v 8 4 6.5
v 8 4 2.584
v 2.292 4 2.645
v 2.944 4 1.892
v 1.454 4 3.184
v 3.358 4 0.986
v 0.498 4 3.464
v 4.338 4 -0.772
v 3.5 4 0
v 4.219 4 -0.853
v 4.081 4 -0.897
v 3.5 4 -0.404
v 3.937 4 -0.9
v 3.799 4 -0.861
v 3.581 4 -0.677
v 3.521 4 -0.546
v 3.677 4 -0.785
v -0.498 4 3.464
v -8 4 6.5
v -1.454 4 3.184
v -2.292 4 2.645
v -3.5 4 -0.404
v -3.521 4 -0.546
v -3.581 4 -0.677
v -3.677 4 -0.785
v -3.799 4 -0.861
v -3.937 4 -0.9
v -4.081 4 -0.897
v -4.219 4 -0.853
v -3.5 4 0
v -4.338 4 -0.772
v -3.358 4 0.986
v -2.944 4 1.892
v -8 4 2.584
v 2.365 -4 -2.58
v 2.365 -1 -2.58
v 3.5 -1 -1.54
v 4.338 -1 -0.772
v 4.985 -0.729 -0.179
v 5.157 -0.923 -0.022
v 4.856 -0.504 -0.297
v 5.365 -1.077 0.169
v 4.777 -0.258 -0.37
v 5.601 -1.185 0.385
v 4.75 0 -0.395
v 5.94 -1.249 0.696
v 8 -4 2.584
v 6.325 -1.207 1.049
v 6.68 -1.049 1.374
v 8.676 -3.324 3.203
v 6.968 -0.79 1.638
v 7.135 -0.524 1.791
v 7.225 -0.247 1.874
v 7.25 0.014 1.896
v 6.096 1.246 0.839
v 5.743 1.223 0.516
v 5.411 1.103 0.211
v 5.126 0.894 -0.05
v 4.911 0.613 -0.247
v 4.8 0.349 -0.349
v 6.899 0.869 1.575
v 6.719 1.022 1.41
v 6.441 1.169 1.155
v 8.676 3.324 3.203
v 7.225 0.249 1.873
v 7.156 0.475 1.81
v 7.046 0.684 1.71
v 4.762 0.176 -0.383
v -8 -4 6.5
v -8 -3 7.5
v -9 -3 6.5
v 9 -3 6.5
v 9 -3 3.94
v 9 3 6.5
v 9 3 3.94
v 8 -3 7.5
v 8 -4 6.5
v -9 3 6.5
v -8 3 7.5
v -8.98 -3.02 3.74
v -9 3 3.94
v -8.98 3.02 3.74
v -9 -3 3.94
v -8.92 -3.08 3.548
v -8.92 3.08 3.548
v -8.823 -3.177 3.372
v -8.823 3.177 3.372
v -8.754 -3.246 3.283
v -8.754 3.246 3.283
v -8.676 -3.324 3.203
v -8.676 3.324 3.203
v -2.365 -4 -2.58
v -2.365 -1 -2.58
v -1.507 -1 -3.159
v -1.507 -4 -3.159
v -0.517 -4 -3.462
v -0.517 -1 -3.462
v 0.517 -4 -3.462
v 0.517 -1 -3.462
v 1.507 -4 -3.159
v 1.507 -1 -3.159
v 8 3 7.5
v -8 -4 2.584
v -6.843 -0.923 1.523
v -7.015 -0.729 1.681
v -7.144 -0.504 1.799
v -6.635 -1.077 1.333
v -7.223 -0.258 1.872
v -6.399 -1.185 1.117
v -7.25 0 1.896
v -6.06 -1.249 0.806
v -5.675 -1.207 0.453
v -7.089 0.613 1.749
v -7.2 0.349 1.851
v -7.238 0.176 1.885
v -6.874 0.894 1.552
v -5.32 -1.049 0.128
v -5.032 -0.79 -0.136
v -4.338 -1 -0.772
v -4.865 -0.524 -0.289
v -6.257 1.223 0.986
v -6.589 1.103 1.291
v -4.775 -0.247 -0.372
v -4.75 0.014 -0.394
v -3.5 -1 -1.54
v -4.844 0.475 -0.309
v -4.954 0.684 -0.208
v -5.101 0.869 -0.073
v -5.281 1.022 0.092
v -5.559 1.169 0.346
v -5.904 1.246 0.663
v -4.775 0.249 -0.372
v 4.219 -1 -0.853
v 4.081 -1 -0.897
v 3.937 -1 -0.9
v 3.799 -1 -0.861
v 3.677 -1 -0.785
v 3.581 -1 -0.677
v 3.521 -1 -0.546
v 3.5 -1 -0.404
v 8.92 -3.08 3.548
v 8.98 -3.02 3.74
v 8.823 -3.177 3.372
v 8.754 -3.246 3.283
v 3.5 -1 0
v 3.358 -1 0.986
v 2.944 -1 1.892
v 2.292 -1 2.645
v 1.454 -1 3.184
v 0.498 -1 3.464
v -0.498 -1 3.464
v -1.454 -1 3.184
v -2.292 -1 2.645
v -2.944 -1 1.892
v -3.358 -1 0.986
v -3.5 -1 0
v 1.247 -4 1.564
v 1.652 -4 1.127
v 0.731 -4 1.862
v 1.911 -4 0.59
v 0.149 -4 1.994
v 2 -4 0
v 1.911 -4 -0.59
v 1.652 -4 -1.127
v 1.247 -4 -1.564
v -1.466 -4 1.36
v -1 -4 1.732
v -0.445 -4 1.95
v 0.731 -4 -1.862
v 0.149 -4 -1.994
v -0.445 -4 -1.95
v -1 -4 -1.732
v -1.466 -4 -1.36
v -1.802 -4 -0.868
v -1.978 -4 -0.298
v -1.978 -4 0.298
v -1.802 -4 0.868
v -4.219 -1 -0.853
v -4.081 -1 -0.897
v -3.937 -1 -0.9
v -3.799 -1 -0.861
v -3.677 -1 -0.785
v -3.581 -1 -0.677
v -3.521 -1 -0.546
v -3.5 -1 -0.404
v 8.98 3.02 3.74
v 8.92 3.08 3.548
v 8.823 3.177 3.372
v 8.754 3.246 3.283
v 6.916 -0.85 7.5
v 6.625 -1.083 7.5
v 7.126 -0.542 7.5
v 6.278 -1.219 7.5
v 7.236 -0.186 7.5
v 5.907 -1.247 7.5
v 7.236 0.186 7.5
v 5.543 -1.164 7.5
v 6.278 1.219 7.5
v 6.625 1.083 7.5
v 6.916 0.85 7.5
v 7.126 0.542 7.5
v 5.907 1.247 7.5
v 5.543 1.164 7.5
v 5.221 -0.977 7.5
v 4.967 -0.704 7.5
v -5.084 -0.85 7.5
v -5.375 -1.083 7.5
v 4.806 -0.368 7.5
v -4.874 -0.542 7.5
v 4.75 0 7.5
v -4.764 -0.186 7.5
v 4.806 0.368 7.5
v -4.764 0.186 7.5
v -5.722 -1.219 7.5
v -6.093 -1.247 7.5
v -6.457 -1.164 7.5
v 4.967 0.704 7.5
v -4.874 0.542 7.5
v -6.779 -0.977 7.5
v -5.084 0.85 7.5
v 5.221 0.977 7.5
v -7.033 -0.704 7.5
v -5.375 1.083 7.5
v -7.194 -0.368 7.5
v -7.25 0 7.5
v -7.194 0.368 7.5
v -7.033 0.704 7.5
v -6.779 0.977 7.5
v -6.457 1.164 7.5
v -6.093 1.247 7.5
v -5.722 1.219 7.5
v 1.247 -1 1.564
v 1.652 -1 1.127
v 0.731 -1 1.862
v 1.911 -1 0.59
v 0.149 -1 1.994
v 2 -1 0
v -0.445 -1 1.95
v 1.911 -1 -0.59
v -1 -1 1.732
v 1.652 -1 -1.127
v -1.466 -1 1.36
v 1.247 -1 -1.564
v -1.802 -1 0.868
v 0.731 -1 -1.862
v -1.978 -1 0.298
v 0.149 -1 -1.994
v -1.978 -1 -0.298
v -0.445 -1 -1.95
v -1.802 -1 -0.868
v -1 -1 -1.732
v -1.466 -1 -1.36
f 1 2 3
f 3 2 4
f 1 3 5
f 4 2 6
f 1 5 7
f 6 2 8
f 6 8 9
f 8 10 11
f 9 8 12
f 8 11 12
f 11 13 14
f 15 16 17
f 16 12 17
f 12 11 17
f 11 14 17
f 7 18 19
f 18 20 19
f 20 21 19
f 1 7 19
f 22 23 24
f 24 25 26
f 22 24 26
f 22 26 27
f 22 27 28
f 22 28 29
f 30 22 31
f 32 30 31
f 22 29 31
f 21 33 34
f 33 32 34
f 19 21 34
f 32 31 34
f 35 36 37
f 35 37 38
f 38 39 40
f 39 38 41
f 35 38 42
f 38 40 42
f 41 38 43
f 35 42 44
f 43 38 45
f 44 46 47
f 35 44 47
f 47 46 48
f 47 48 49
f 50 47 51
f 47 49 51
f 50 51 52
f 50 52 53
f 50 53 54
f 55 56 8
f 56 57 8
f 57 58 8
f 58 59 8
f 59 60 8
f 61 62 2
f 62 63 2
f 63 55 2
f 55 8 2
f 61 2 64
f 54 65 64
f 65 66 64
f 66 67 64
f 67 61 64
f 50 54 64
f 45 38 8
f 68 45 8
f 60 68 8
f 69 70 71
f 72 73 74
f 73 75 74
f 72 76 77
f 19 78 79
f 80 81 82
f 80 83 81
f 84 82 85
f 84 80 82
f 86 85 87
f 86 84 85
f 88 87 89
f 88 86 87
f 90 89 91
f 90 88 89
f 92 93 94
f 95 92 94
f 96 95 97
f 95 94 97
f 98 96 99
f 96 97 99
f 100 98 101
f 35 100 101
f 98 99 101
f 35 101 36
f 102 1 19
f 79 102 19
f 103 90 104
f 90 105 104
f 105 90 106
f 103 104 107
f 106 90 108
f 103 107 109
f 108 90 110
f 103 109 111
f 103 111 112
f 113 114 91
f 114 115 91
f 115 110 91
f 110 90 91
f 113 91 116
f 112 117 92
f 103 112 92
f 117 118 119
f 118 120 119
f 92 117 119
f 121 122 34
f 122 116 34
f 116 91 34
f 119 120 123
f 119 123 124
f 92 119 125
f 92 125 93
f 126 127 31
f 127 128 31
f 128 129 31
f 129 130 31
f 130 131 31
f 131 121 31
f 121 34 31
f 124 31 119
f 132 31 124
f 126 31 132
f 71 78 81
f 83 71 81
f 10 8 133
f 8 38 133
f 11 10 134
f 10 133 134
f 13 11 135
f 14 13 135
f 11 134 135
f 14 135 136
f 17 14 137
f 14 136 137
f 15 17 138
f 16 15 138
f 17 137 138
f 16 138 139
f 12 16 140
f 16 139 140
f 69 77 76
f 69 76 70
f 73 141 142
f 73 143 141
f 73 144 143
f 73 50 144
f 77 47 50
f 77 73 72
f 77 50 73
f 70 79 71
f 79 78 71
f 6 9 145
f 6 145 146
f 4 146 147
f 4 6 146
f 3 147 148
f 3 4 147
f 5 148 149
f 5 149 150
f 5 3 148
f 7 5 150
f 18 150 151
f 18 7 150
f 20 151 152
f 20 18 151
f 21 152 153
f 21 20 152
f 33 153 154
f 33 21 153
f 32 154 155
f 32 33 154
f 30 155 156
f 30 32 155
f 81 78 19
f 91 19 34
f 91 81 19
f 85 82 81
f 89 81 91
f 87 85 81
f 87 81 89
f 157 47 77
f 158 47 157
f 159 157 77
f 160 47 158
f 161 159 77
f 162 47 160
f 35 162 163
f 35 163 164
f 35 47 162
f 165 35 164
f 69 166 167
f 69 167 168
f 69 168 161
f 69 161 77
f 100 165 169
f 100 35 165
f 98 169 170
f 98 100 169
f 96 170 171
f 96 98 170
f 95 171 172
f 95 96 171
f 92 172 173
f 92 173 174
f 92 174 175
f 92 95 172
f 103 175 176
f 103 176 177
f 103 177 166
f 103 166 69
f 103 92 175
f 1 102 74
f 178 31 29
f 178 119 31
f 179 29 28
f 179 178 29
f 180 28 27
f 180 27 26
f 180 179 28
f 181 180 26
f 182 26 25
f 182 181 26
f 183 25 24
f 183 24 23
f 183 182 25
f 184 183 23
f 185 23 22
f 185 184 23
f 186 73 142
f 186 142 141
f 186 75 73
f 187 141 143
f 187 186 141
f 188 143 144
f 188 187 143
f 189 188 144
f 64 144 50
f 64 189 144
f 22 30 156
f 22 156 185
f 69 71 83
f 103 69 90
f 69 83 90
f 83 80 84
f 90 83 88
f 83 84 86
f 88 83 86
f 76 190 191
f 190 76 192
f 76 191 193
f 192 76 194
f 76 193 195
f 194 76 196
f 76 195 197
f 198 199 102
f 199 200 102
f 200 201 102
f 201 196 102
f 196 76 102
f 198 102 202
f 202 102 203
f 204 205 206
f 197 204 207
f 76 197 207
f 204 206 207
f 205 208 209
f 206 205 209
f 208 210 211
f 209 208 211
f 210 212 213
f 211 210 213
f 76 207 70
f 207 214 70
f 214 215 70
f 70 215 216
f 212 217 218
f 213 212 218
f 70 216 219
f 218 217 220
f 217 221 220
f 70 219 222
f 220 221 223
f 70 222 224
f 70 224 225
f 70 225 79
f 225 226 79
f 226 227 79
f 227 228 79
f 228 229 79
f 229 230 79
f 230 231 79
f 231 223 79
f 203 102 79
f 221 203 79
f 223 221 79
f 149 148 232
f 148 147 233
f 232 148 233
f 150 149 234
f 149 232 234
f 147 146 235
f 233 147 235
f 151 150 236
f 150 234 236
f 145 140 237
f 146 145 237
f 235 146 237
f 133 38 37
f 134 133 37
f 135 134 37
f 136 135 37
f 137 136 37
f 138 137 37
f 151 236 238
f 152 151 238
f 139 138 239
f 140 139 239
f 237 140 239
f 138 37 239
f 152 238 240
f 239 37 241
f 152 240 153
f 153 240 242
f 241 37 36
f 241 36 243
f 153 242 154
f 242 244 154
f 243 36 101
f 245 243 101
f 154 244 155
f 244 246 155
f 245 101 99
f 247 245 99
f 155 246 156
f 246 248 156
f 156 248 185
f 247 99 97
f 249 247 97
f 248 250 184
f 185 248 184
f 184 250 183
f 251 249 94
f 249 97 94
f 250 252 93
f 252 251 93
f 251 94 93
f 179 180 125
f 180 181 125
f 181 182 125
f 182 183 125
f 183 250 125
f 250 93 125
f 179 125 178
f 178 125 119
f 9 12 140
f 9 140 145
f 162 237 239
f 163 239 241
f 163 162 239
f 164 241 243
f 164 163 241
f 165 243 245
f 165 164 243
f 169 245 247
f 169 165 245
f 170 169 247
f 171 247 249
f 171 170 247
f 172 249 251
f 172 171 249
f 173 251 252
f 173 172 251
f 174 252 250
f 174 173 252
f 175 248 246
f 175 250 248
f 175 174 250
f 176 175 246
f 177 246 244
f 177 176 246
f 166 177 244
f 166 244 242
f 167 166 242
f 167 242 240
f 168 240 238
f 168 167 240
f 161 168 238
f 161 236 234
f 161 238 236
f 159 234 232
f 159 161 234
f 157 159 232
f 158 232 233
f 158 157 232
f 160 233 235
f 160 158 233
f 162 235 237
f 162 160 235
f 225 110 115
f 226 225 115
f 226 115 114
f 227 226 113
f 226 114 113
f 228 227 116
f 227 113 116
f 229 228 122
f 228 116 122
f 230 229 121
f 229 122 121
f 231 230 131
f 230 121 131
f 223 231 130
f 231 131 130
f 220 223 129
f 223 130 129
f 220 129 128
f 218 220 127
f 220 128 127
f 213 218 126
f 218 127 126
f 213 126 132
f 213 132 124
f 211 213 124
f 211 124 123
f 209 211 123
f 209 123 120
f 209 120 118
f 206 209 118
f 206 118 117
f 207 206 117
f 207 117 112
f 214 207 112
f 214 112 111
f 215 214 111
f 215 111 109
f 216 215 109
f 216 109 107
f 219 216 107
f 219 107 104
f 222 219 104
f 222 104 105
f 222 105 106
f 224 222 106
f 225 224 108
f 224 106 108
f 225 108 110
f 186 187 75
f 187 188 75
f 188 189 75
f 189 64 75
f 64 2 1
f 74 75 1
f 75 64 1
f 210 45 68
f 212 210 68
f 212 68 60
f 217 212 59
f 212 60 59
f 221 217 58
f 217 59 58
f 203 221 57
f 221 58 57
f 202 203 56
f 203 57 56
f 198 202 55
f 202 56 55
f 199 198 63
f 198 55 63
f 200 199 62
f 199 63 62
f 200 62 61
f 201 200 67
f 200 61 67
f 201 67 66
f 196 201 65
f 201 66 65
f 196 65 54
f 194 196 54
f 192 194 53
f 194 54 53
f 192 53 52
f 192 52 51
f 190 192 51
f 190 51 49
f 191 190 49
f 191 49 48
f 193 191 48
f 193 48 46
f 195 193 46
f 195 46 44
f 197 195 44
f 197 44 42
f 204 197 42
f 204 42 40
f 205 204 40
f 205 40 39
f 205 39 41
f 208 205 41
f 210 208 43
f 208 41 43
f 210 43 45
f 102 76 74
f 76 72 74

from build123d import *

# Parameters (mm, degrees)
SKETCH_1_R          = 2
EXTRUDE_1_DEPTH     = 4
HOLE_WIZARD_M3_1_D  = 2.5
CUT_EXTRUDE_1_DEPTH = 5
CHAMFER_1_SIZE      = 1
FILLET_1_R          = 1
FILLET_2_R          = 0.5


with BuildPart() as part:
    # 草图1 → 凸台-拉伸1 (new body, symmetric)
    with BuildSketch(Plane(origin=(0, 0, 0), x_dir=(1, 0, 0), z_dir=(0, 1, 0))):
        with BuildLine():
            Line((9, -7.5), (-9, -7.5))
            Line((-9, -7.5), (-9, -3.5))
            Line((-9, -3.5), (-2.36461126, 2.580428954))
            ThreePointArc((-2.36461126, 2.580428954), (0, 3.5), (2.36461126, 2.580428954))
            Line((2.36461126, 2.580428954), (9, -3.5))
            Line((9, -3.5), (9, -7.5))
        make_face()
        Circle(SKETCH_1_R, mode=Mode.SUBTRACT)
    extrude(amount=EXTRUDE_1_DEPTH, both=True)

    # M3 螺纹孔1 (through all)
    with Locations(Plane.XY.offset(7.5)):
        with Locations((-6, 0), (6, 0)):
            Hole(HOLE_WIZARD_M3_1_D / 2)

    # 草图4 → 切除-拉伸1 (cut)
    with BuildSketch(Plane(origin=(0, 4, 0), x_dir=(1, 0, 0), z_dir=(0, 1, 0))):
        with BuildLine():
            Line((-3.5, 0), (-3.5, 1.54))
            Line((-3.5, 1.54), (-2.36461126, 2.580428954))
            ThreePointArc((-2.36461126, 2.580428954), (0, 3.5), (2.36461126, 2.580428954))
            Line((2.36461126, 2.580428954), (3.5, 1.54))
            Line((3.5, 1.54), (3.5, 0))
            ThreePointArc((3.5, 0), (0, -3.5), (-3.5, 0))
        make_face()
    extrude(amount=-CUT_EXTRUDE_1_DEPTH, mode=Mode.SUBTRACT)

    # 倒角1
    chamfer_1_edges = [part.edges().sort_by_distance(p)[0] for p in [
        (9, 0, 7.5),
        (-9, 0, 7.5),
        (-9, 4, 5.5),
        (0, 4, 7.5),
        (9, 4, 5.5),
        (0, -4, 7.5),
        (-9, -4, 5.5),
        (9, -4, 5.5),
    ]]
    chamfer(chamfer_1_edges, length=CHAMFER_1_SIZE)

    # 圆角1
    fillet_1_edges = [part.edges().sort_by_distance(p)[0] for p in [
        (-9, 0, 3.5),
        (9, 0, 3.5),
    ]]
    fillet(fillet_1_edges, radius=FILLET_1_R)

    # 圆角2
    fillet_2_edges = [part.edges().sort_by_distance(p)[0] for p in [
        (-3.5, 1.5, -1.54),
        (3.5, 1.5, -1.54),
    ]]
    fillet(fillet_2_edges, radius=FILLET_2_R)


solid = part.part
